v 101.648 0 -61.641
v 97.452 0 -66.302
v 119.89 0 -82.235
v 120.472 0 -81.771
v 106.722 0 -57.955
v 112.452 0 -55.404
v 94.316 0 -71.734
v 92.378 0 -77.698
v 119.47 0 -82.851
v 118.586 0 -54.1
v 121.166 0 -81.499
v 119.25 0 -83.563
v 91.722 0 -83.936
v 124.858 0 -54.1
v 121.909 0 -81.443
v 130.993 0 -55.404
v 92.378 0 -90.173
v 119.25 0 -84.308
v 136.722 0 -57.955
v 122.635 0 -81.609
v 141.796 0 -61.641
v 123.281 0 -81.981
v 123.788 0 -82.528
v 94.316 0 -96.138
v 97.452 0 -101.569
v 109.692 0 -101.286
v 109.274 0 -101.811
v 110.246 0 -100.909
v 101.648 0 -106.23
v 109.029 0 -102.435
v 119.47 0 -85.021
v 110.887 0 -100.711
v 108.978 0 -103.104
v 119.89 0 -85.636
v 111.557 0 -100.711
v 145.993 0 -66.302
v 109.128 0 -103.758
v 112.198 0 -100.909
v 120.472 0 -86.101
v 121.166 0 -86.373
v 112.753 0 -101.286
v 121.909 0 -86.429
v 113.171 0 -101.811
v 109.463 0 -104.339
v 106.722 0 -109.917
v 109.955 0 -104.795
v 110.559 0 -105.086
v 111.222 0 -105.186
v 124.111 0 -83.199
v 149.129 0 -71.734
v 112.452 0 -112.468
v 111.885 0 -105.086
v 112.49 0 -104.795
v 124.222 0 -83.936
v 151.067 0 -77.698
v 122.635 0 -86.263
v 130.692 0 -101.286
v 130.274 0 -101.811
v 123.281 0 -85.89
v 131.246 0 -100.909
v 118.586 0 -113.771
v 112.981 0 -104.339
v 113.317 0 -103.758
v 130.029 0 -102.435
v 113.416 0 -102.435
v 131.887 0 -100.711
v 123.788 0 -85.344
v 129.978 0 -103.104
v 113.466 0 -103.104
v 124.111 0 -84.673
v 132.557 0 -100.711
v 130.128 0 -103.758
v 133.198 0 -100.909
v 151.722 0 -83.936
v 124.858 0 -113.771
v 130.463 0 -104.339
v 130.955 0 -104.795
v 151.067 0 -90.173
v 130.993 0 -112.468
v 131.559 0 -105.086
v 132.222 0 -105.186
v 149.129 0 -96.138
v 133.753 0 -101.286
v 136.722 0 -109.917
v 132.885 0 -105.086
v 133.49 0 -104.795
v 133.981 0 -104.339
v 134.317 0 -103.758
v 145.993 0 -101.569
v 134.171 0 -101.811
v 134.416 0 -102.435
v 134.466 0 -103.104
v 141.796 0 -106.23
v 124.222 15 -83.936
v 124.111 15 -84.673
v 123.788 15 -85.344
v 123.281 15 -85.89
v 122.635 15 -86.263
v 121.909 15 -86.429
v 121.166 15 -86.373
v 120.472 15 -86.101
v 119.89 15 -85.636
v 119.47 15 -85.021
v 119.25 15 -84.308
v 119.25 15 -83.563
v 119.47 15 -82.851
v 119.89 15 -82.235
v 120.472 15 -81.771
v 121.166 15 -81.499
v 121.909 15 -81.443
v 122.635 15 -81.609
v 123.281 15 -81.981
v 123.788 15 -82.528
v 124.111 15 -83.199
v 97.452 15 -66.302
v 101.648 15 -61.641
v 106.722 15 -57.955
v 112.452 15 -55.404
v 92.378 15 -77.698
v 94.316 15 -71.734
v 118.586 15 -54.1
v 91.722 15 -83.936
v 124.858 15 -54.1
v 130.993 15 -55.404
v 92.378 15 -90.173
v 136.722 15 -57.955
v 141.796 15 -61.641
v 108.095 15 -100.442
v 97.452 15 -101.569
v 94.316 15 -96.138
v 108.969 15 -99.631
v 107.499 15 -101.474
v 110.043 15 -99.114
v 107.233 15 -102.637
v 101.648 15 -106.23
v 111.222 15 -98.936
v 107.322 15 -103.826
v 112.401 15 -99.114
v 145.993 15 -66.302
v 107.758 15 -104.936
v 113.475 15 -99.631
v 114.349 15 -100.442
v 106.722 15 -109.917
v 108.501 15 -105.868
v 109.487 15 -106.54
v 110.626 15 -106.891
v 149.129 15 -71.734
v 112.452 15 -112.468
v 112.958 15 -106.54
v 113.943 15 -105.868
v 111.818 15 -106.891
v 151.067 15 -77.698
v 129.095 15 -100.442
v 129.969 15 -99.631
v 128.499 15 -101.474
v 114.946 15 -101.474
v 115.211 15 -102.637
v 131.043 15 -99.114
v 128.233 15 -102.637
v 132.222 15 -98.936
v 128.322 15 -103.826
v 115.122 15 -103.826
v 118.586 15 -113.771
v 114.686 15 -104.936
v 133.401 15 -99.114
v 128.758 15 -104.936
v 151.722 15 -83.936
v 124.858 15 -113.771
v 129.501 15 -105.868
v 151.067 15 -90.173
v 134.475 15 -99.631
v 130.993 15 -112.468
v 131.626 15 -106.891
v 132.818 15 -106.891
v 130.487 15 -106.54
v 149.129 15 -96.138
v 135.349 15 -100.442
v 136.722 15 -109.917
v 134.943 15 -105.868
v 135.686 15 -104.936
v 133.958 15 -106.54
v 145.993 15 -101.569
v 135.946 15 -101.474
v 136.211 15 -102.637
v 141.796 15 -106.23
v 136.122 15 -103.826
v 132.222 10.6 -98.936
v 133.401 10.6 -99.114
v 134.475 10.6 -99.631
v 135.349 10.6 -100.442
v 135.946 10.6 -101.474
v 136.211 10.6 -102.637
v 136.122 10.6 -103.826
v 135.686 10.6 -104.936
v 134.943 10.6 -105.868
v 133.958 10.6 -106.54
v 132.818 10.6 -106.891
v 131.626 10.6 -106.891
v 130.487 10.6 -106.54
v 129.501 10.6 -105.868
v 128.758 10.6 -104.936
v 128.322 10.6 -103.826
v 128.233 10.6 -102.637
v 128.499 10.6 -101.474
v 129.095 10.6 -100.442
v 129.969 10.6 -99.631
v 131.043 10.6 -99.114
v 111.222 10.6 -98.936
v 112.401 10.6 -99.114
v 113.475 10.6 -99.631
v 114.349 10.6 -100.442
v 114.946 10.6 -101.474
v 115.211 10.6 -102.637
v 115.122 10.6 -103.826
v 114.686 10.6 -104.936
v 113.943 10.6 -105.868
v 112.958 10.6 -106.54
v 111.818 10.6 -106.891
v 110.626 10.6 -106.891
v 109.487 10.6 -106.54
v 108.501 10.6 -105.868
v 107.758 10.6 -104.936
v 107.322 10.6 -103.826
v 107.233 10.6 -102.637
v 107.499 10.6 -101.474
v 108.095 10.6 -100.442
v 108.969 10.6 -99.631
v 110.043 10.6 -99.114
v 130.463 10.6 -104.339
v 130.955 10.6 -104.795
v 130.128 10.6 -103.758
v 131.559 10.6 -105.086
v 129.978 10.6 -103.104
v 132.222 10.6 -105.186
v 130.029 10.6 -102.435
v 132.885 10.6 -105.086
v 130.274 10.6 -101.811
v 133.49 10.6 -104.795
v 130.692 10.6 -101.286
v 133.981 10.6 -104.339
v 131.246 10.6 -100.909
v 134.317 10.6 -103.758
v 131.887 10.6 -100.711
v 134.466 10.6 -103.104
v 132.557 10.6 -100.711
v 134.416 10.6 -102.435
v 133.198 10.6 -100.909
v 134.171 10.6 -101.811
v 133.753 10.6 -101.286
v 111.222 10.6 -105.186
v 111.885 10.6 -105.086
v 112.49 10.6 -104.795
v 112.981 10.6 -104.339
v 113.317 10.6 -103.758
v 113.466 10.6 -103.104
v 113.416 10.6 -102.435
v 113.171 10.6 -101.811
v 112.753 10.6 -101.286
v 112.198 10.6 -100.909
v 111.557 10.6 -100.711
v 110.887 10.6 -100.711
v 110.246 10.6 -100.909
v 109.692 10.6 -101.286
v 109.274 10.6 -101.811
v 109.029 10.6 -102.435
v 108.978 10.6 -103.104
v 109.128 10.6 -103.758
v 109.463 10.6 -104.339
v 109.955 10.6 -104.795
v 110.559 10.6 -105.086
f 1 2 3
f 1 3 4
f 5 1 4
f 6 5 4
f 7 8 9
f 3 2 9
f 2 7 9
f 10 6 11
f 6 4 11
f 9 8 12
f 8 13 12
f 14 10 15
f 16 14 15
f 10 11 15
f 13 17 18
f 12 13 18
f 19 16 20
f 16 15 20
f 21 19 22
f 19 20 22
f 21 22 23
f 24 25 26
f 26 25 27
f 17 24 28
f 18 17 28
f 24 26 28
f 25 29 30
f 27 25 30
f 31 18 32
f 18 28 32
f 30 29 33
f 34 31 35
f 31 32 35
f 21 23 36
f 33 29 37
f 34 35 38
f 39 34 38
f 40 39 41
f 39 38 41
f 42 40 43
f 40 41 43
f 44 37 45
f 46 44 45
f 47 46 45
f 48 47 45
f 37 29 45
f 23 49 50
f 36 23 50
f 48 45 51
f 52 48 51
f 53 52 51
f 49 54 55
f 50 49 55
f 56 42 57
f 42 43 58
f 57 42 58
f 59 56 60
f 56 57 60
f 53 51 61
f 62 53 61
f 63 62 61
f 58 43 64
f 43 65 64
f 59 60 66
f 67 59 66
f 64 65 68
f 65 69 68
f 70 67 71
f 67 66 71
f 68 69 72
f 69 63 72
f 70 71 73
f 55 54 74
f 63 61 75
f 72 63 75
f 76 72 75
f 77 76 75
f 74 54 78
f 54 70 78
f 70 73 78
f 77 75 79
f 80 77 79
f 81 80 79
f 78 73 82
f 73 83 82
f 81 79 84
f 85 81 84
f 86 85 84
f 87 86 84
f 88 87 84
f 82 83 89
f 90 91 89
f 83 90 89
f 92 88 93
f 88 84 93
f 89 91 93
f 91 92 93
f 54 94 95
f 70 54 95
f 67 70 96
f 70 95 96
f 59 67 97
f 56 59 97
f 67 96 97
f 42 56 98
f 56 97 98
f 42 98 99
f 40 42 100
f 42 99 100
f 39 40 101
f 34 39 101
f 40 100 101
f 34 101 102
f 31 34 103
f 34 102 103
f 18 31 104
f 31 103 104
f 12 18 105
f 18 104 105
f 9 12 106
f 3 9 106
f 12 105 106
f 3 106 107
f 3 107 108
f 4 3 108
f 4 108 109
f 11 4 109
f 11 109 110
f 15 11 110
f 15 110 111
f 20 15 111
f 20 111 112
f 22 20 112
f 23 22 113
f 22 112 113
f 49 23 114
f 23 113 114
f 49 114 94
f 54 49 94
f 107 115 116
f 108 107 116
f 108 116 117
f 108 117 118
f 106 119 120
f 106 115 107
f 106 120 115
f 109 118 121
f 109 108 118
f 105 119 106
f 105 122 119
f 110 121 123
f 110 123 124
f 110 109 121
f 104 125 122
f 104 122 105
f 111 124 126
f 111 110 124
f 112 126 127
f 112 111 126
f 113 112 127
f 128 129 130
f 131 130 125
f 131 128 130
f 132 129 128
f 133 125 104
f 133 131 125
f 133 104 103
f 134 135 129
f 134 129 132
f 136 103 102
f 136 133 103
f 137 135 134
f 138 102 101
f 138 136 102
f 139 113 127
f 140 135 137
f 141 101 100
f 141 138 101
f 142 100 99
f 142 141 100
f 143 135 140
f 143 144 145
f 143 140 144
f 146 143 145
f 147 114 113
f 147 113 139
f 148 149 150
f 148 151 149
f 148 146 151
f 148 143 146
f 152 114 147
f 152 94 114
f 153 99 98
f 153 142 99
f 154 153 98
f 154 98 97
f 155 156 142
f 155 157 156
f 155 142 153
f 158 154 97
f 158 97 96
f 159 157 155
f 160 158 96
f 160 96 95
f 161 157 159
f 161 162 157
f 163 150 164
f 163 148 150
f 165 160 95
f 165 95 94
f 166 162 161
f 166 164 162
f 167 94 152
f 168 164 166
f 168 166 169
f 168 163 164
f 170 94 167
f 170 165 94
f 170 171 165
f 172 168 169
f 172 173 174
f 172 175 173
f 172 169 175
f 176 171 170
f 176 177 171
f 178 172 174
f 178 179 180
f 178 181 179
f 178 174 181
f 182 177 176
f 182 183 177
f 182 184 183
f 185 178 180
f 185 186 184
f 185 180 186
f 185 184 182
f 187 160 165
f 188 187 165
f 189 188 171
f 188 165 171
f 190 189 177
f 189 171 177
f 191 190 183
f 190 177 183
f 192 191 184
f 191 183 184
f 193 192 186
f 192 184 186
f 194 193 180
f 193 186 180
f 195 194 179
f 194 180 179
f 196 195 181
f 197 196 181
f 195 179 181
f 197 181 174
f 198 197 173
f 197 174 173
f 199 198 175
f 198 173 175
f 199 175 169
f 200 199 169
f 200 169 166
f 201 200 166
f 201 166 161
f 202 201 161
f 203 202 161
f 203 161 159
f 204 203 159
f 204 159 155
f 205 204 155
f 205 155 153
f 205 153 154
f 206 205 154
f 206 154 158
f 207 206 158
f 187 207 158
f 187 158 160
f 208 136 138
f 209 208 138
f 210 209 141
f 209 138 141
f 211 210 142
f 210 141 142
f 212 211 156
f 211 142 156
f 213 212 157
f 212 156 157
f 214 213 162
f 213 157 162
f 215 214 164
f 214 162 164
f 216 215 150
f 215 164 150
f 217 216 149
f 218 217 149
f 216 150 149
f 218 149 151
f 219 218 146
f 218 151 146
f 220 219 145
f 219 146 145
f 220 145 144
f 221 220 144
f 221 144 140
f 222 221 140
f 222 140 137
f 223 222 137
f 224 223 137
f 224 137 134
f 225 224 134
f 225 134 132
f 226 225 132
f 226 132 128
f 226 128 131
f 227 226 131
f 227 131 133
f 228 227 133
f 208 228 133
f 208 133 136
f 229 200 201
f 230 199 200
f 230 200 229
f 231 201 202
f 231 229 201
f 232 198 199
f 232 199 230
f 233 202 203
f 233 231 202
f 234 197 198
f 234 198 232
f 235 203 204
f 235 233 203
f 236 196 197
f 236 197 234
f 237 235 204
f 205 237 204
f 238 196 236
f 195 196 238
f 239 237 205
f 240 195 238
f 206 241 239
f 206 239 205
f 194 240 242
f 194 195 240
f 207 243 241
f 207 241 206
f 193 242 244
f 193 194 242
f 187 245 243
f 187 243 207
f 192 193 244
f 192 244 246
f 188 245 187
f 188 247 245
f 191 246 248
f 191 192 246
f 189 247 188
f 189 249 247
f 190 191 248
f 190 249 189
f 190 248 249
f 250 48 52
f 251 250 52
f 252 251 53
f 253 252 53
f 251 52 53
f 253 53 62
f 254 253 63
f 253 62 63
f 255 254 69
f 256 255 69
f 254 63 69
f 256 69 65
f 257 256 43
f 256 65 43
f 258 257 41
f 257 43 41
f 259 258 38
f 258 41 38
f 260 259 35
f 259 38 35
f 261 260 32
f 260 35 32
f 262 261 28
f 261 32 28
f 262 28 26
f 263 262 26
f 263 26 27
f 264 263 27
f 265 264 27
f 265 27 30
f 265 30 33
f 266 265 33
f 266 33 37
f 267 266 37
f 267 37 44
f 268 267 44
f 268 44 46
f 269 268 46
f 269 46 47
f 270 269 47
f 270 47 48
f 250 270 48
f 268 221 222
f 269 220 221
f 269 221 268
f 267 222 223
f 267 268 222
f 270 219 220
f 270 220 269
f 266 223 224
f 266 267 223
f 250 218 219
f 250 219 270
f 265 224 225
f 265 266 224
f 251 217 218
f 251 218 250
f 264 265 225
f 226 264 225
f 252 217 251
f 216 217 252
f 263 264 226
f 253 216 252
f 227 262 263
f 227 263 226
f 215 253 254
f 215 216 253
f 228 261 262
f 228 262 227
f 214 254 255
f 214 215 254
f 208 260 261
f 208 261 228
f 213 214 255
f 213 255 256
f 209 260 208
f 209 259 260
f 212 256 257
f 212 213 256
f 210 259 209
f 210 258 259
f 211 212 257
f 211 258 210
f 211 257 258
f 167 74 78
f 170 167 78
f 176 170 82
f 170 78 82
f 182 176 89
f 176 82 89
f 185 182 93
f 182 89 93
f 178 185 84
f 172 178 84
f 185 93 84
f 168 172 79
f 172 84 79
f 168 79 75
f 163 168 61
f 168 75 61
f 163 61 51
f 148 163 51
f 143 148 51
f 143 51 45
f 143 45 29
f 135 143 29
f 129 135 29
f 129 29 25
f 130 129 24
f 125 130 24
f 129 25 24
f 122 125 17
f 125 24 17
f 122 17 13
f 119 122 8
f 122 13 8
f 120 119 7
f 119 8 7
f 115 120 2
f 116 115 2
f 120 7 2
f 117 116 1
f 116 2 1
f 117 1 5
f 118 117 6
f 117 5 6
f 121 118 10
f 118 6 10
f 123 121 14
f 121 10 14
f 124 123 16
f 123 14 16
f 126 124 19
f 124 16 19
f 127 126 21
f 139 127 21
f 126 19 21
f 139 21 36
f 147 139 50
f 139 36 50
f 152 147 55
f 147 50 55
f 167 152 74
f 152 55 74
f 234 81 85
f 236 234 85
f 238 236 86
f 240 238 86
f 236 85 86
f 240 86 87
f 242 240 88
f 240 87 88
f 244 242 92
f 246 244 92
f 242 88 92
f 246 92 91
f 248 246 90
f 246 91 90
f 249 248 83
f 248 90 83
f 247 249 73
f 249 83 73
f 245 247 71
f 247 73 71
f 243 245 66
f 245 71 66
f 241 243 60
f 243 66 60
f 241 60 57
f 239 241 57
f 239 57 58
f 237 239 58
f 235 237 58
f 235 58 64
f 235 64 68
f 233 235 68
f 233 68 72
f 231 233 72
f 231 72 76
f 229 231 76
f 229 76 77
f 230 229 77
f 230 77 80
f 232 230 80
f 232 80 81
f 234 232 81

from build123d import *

# Parameters (mm, degrees)
SKETCH1_R                                           = 30
BOSS_EXTRUDE1_DEPTH                                 = 15
SKETCH10_R                                          = 2.5
CUT_EXTRUDE2_DEPTH                                  = 15
CBORE_FOR_M4_HEX_SOCKET_HEAD_CAP_SCREW3_D           = 4.5
CBORE_FOR_M4_HEX_SOCKET_HEAD_CAP_SCREW3_DEPTH       = 15
CBORE_FOR_M4_HEX_SOCKET_HEAD_CAP_SCREW3_CBORE_D     = 8
CBORE_FOR_M4_HEX_SOCKET_HEAD_CAP_SCREW3_CBORE_DEPTH = 4.4


with BuildPart() as part:
    # Sketch1 → Boss-Extrude1 (new body)
    with BuildSketch(Plane(origin=(0, 0, 0), x_dir=(1, 0, 0), z_dir=(0, 1, 0))):
        with Locations((121.722144349, 83.935831041)):
            Circle(SKETCH1_R)
    extrude(amount=BOSS_EXTRUDE1_DEPTH)

    # Sketch10 → Cut-Extrude2 (cut)
    with BuildSketch(Plane(origin=(0, 15, 0), x_dir=(1, 0, 0), z_dir=(0, 1, 0))):
        with Locations((121.722144349, 83.935831041)):
            Circle(SKETCH10_R)
    extrude(amount=-CUT_EXTRUDE2_DEPTH, mode=Mode.SUBTRACT)

    # CBORE for M4 Hex Socket Head Cap Screw3
    with Locations(Plane(origin=(132.222144349, 15, -102.935831041), x_dir=(0, 0, 1), z_dir=(0, 1, 0))):
        with Locations((0, 0), (0, -21)):
            CounterBoreHole(CBORE_FOR_M4_HEX_SOCKET_HEAD_CAP_SCREW3_D / 2, CBORE_FOR_M4_HEX_SOCKET_HEAD_CAP_SCREW3_CBORE_D / 2, CBORE_FOR_M4_HEX_SOCKET_HEAD_CAP_SCREW3_CBORE_DEPTH, depth=CBORE_FOR_M4_HEX_SOCKET_HEAD_CAP_SCREW3_DEPTH)


solid = part.part
